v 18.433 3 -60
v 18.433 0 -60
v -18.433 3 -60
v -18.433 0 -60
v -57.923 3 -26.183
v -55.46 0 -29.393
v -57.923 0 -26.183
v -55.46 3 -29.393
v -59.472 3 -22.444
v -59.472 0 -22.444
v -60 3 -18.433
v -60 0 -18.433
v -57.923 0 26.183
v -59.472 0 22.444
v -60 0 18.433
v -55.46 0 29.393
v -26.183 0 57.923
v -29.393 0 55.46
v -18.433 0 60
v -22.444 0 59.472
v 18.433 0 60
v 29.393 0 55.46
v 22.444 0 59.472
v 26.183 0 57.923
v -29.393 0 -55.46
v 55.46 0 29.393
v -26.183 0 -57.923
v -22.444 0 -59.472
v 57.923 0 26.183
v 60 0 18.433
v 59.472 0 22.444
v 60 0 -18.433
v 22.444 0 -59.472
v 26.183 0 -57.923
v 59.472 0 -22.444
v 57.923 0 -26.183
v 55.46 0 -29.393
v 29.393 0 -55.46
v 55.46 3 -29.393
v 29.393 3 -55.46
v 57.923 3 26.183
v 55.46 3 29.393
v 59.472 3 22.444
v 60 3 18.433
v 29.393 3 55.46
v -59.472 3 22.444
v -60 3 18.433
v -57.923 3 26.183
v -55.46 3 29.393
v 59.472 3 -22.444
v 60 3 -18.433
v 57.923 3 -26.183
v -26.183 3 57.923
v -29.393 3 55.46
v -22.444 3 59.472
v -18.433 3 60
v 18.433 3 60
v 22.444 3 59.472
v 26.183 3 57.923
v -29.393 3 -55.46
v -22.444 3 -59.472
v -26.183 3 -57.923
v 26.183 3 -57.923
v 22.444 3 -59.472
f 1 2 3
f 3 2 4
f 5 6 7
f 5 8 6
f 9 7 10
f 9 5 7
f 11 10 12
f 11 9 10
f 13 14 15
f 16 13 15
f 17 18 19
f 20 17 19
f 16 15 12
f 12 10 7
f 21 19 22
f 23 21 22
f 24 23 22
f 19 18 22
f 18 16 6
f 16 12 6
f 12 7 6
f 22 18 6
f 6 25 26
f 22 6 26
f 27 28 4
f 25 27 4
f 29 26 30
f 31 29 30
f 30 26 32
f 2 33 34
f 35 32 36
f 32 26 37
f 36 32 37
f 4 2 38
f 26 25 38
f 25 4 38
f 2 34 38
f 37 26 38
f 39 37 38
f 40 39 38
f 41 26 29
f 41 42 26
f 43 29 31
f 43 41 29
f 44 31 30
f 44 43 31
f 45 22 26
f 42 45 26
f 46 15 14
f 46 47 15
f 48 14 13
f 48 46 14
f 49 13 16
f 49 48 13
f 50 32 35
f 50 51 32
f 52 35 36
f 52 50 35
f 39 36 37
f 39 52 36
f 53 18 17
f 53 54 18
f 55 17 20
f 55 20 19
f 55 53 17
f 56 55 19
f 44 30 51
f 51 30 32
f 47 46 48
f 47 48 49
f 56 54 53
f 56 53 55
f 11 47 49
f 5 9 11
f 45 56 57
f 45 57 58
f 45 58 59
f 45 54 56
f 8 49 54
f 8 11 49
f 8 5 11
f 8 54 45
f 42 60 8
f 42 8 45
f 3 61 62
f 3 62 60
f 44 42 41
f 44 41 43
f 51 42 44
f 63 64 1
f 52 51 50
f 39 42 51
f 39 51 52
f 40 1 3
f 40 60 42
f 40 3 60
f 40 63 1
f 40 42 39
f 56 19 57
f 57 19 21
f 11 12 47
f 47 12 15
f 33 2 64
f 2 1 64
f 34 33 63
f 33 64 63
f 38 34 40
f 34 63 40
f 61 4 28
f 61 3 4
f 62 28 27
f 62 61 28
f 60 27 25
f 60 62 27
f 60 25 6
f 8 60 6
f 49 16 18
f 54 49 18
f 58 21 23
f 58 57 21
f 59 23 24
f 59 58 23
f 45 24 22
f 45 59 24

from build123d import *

# Parameters (mm, degrees)
EXTRUDE_1_DEPTH = 3
FILLET_1_R      = 15.5


with BuildPart() as part:
    # 草图1 → 凸台-拉伸1 (new body)
    with BuildSketch(Plane(origin=(0, 0, 0), x_dir=(1, 0, 0), z_dir=(0, 1, 0))):
        Polygon((24.852813742, 60), (-24.852813742, 60), (-60, 24.852813742), (-60, -24.852813742), (-24.852813742, -60), (24.852813742, -60), (60, -24.852813742), (60, 24.852813742), align=None)
    extrude(amount=EXTRUDE_1_DEPTH)

    # 圆角1
    fillet_1_edges = [part.edges().sort_by_distance(p)[0] for p in [
        (-60, 1.5, -24.852813742),
        (-24.852813742, 1.5, -60),
        (24.852813742, 1.5, -60),
        (60, 1.5, 24.852813742),
        (-24.852813742, 1.5, 60),
        (-60, 1.5, 24.852813742),
        (24.852813742, 1.5, 60),
        (60, 1.5, -24.852813742),
    ]]
    fillet(fillet_1_edges, radius=FILLET_1_R)


solid = part.part
